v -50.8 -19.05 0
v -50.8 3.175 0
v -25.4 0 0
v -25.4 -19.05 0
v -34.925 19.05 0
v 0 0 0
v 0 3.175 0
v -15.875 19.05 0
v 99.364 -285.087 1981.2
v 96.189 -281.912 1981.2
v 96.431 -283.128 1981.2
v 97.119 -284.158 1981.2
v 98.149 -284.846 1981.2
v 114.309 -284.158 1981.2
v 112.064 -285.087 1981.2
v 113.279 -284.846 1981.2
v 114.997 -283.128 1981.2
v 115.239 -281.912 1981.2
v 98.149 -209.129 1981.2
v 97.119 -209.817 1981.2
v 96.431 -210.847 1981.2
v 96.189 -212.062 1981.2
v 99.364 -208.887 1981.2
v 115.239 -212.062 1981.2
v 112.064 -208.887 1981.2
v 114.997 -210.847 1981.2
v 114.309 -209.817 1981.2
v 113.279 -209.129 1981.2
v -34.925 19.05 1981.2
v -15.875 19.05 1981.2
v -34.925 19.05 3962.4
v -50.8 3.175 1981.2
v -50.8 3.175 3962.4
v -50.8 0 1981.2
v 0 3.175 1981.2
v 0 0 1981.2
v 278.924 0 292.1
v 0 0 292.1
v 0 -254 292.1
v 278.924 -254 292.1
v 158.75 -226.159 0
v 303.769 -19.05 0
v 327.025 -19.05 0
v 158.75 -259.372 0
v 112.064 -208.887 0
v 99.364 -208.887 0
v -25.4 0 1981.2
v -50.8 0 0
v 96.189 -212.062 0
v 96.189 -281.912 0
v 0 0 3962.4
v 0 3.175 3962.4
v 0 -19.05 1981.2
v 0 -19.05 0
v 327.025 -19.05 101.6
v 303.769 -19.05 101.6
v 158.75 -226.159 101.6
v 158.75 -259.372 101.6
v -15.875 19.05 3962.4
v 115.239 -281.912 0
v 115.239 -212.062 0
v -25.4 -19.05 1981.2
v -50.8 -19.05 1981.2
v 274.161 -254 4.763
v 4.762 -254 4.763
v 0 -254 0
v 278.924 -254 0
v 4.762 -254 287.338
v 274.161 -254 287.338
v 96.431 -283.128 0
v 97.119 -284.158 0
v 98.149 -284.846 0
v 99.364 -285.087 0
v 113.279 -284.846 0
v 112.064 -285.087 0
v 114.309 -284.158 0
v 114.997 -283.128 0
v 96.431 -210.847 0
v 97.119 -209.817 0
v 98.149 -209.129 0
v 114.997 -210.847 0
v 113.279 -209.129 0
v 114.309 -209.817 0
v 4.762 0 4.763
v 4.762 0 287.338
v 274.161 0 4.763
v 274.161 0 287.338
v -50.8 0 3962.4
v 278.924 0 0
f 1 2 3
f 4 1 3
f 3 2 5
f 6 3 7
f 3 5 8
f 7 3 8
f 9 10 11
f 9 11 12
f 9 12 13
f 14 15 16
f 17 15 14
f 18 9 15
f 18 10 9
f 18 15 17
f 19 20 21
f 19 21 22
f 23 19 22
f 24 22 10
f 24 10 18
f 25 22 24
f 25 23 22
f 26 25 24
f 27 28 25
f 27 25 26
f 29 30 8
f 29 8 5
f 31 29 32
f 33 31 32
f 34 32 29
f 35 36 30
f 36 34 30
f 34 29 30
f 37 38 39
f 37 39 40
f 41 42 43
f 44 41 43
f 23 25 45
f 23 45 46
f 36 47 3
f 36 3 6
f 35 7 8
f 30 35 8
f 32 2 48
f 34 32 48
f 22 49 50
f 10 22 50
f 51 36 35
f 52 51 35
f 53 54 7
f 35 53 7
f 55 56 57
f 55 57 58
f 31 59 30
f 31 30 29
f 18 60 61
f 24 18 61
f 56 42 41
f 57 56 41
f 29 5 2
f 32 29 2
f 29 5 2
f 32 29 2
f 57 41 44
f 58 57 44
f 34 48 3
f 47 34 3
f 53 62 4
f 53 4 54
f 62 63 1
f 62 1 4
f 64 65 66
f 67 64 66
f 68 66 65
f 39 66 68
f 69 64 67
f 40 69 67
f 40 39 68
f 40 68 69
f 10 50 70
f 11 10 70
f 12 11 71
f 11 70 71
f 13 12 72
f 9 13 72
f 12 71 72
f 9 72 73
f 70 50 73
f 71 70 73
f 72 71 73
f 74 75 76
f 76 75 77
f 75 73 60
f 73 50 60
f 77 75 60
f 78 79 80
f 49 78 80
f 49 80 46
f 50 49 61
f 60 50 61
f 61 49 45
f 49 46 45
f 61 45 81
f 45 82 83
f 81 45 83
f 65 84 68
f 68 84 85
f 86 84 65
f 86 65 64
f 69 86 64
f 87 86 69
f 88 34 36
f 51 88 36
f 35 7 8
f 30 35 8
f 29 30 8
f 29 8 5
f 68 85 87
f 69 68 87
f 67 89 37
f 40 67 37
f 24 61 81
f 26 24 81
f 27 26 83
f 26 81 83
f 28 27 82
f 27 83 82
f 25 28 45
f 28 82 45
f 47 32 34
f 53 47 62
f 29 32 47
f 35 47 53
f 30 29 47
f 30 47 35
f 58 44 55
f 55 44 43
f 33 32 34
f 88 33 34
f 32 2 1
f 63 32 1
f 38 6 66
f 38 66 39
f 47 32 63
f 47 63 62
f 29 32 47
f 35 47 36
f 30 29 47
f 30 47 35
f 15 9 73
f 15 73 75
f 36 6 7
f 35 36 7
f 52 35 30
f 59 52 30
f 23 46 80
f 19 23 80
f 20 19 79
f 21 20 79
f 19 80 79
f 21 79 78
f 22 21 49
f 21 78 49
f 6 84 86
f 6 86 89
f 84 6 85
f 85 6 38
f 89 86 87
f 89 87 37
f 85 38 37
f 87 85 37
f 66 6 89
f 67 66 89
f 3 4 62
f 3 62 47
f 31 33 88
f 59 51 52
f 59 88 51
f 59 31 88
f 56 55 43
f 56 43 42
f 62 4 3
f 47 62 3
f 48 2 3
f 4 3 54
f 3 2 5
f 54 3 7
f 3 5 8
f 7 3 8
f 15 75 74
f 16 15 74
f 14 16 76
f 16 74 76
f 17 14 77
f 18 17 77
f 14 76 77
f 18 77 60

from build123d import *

# Parameters (mm, degrees)
F0_W      = 278.923513
F0_H      = 292.1
F0_W_2    = 269.398513
F0_H_2    = 282.575
F1_DEPTH  = 254
F2_W      = 25.4
F2_H      = 19.05
F3_DEPTH  = 1981.2
F4_DEPTH  = 1981.2
F6_DEPTH  = 1981.2
F8_DEPTH  = 101.6
F10_DEPTH = 1981.2


with BuildPart() as f1:
    # F0 (on Front) → F1 (new body)
    with BuildSketch(Plane.XZ):
        with Locations((139.461757, 146.05)):
            Rectangle(F0_W, F0_H)
        with Locations((139.461756, 146.05)):
            Rectangle(F0_W_2, F0_H_2, mode=Mode.SUBTRACT)
    extrude(amount=F1_DEPTH)


with BuildPart() as f3:
    # F2 (on Top) → F3 (new body)
    with BuildSketch(Plane.XY):
        Polygon((-25.4, 0), (0, 0), (0, 3.175), (-15.875, 19.05), (-34.925, 19.05), (-50.8, 3.175), (-50.8, 0), align=None)
        with Locations((-38.1, -9.525)):
            Rectangle(F2_W, F2_H)
    extrude(amount=F3_DEPTH)


with BuildPart() as f4:
    # F2 (on Top) → F4 (new body)
    with BuildSketch(Plane.XY):
        Polygon((-25.4, 0), (0, 0), (0, 3.175), (-15.875, 19.05), (-34.925, 19.05), (-50.8, 3.175), (-50.8, 0), align=None)
        with Locations((-12.7, -9.525)):
            Rectangle(F2_W, F2_H)
    extrude(amount=F4_DEPTH)


with BuildPart() as f6:
    # F5 (on Top) → F6 (new body)
    with BuildSketch(Plane.XY):
        with BuildLine():
            ThreePointArc((96.189181, -281.912499), (97.119117, -284.157563), (99.364181, -285.087499))
            Line((99.364181, -285.087499), (112.064181, -285.087499))
            ThreePointArc((112.064181, -285.087499), (114.309245, -284.157563), (115.239181, -281.912499))
            Line((115.239181, -281.912499), (115.239181, -212.062499))
            ThreePointArc((115.239181, -212.062499), (114.309245, -209.817435), (112.064181, -208.887499))
            Line((112.064181, -208.887499), (99.364181, -208.887499))
            ThreePointArc((99.364181, -208.887499), (97.119117, -209.817435), (96.189181, -212.062499))
            Line((96.189181, -212.062499), (96.189181, -281.912499))
        make_face()
    extrude(amount=F6_DEPTH)


with BuildPart() as f8:
    # F7 (on Top) → F8 (new body)
    with BuildSketch(Plane.XY):
        Polygon((303.769244, -19.05), (158.75, -226.158944), (158.75, -259.371606), (327.025, -19.05), align=None)
    extrude(amount=F8_DEPTH)


with BuildPart() as f10:
    # F9 (on face) → F10 (new body)
    with BuildSketch(Plane.XY.offset(1981.2)):
        Polygon((0, 0), (0, 3.175), (-15.875, 19.05), (-34.925, 19.05), (-50.8, 3.175), (-50.8, 0), (-25.4, 0), align=None)
    extrude(amount=F10_DEPTH)


solid = Compound([f1.part, f3.part, f4.part, f6.part, f8.part, f10.part])
